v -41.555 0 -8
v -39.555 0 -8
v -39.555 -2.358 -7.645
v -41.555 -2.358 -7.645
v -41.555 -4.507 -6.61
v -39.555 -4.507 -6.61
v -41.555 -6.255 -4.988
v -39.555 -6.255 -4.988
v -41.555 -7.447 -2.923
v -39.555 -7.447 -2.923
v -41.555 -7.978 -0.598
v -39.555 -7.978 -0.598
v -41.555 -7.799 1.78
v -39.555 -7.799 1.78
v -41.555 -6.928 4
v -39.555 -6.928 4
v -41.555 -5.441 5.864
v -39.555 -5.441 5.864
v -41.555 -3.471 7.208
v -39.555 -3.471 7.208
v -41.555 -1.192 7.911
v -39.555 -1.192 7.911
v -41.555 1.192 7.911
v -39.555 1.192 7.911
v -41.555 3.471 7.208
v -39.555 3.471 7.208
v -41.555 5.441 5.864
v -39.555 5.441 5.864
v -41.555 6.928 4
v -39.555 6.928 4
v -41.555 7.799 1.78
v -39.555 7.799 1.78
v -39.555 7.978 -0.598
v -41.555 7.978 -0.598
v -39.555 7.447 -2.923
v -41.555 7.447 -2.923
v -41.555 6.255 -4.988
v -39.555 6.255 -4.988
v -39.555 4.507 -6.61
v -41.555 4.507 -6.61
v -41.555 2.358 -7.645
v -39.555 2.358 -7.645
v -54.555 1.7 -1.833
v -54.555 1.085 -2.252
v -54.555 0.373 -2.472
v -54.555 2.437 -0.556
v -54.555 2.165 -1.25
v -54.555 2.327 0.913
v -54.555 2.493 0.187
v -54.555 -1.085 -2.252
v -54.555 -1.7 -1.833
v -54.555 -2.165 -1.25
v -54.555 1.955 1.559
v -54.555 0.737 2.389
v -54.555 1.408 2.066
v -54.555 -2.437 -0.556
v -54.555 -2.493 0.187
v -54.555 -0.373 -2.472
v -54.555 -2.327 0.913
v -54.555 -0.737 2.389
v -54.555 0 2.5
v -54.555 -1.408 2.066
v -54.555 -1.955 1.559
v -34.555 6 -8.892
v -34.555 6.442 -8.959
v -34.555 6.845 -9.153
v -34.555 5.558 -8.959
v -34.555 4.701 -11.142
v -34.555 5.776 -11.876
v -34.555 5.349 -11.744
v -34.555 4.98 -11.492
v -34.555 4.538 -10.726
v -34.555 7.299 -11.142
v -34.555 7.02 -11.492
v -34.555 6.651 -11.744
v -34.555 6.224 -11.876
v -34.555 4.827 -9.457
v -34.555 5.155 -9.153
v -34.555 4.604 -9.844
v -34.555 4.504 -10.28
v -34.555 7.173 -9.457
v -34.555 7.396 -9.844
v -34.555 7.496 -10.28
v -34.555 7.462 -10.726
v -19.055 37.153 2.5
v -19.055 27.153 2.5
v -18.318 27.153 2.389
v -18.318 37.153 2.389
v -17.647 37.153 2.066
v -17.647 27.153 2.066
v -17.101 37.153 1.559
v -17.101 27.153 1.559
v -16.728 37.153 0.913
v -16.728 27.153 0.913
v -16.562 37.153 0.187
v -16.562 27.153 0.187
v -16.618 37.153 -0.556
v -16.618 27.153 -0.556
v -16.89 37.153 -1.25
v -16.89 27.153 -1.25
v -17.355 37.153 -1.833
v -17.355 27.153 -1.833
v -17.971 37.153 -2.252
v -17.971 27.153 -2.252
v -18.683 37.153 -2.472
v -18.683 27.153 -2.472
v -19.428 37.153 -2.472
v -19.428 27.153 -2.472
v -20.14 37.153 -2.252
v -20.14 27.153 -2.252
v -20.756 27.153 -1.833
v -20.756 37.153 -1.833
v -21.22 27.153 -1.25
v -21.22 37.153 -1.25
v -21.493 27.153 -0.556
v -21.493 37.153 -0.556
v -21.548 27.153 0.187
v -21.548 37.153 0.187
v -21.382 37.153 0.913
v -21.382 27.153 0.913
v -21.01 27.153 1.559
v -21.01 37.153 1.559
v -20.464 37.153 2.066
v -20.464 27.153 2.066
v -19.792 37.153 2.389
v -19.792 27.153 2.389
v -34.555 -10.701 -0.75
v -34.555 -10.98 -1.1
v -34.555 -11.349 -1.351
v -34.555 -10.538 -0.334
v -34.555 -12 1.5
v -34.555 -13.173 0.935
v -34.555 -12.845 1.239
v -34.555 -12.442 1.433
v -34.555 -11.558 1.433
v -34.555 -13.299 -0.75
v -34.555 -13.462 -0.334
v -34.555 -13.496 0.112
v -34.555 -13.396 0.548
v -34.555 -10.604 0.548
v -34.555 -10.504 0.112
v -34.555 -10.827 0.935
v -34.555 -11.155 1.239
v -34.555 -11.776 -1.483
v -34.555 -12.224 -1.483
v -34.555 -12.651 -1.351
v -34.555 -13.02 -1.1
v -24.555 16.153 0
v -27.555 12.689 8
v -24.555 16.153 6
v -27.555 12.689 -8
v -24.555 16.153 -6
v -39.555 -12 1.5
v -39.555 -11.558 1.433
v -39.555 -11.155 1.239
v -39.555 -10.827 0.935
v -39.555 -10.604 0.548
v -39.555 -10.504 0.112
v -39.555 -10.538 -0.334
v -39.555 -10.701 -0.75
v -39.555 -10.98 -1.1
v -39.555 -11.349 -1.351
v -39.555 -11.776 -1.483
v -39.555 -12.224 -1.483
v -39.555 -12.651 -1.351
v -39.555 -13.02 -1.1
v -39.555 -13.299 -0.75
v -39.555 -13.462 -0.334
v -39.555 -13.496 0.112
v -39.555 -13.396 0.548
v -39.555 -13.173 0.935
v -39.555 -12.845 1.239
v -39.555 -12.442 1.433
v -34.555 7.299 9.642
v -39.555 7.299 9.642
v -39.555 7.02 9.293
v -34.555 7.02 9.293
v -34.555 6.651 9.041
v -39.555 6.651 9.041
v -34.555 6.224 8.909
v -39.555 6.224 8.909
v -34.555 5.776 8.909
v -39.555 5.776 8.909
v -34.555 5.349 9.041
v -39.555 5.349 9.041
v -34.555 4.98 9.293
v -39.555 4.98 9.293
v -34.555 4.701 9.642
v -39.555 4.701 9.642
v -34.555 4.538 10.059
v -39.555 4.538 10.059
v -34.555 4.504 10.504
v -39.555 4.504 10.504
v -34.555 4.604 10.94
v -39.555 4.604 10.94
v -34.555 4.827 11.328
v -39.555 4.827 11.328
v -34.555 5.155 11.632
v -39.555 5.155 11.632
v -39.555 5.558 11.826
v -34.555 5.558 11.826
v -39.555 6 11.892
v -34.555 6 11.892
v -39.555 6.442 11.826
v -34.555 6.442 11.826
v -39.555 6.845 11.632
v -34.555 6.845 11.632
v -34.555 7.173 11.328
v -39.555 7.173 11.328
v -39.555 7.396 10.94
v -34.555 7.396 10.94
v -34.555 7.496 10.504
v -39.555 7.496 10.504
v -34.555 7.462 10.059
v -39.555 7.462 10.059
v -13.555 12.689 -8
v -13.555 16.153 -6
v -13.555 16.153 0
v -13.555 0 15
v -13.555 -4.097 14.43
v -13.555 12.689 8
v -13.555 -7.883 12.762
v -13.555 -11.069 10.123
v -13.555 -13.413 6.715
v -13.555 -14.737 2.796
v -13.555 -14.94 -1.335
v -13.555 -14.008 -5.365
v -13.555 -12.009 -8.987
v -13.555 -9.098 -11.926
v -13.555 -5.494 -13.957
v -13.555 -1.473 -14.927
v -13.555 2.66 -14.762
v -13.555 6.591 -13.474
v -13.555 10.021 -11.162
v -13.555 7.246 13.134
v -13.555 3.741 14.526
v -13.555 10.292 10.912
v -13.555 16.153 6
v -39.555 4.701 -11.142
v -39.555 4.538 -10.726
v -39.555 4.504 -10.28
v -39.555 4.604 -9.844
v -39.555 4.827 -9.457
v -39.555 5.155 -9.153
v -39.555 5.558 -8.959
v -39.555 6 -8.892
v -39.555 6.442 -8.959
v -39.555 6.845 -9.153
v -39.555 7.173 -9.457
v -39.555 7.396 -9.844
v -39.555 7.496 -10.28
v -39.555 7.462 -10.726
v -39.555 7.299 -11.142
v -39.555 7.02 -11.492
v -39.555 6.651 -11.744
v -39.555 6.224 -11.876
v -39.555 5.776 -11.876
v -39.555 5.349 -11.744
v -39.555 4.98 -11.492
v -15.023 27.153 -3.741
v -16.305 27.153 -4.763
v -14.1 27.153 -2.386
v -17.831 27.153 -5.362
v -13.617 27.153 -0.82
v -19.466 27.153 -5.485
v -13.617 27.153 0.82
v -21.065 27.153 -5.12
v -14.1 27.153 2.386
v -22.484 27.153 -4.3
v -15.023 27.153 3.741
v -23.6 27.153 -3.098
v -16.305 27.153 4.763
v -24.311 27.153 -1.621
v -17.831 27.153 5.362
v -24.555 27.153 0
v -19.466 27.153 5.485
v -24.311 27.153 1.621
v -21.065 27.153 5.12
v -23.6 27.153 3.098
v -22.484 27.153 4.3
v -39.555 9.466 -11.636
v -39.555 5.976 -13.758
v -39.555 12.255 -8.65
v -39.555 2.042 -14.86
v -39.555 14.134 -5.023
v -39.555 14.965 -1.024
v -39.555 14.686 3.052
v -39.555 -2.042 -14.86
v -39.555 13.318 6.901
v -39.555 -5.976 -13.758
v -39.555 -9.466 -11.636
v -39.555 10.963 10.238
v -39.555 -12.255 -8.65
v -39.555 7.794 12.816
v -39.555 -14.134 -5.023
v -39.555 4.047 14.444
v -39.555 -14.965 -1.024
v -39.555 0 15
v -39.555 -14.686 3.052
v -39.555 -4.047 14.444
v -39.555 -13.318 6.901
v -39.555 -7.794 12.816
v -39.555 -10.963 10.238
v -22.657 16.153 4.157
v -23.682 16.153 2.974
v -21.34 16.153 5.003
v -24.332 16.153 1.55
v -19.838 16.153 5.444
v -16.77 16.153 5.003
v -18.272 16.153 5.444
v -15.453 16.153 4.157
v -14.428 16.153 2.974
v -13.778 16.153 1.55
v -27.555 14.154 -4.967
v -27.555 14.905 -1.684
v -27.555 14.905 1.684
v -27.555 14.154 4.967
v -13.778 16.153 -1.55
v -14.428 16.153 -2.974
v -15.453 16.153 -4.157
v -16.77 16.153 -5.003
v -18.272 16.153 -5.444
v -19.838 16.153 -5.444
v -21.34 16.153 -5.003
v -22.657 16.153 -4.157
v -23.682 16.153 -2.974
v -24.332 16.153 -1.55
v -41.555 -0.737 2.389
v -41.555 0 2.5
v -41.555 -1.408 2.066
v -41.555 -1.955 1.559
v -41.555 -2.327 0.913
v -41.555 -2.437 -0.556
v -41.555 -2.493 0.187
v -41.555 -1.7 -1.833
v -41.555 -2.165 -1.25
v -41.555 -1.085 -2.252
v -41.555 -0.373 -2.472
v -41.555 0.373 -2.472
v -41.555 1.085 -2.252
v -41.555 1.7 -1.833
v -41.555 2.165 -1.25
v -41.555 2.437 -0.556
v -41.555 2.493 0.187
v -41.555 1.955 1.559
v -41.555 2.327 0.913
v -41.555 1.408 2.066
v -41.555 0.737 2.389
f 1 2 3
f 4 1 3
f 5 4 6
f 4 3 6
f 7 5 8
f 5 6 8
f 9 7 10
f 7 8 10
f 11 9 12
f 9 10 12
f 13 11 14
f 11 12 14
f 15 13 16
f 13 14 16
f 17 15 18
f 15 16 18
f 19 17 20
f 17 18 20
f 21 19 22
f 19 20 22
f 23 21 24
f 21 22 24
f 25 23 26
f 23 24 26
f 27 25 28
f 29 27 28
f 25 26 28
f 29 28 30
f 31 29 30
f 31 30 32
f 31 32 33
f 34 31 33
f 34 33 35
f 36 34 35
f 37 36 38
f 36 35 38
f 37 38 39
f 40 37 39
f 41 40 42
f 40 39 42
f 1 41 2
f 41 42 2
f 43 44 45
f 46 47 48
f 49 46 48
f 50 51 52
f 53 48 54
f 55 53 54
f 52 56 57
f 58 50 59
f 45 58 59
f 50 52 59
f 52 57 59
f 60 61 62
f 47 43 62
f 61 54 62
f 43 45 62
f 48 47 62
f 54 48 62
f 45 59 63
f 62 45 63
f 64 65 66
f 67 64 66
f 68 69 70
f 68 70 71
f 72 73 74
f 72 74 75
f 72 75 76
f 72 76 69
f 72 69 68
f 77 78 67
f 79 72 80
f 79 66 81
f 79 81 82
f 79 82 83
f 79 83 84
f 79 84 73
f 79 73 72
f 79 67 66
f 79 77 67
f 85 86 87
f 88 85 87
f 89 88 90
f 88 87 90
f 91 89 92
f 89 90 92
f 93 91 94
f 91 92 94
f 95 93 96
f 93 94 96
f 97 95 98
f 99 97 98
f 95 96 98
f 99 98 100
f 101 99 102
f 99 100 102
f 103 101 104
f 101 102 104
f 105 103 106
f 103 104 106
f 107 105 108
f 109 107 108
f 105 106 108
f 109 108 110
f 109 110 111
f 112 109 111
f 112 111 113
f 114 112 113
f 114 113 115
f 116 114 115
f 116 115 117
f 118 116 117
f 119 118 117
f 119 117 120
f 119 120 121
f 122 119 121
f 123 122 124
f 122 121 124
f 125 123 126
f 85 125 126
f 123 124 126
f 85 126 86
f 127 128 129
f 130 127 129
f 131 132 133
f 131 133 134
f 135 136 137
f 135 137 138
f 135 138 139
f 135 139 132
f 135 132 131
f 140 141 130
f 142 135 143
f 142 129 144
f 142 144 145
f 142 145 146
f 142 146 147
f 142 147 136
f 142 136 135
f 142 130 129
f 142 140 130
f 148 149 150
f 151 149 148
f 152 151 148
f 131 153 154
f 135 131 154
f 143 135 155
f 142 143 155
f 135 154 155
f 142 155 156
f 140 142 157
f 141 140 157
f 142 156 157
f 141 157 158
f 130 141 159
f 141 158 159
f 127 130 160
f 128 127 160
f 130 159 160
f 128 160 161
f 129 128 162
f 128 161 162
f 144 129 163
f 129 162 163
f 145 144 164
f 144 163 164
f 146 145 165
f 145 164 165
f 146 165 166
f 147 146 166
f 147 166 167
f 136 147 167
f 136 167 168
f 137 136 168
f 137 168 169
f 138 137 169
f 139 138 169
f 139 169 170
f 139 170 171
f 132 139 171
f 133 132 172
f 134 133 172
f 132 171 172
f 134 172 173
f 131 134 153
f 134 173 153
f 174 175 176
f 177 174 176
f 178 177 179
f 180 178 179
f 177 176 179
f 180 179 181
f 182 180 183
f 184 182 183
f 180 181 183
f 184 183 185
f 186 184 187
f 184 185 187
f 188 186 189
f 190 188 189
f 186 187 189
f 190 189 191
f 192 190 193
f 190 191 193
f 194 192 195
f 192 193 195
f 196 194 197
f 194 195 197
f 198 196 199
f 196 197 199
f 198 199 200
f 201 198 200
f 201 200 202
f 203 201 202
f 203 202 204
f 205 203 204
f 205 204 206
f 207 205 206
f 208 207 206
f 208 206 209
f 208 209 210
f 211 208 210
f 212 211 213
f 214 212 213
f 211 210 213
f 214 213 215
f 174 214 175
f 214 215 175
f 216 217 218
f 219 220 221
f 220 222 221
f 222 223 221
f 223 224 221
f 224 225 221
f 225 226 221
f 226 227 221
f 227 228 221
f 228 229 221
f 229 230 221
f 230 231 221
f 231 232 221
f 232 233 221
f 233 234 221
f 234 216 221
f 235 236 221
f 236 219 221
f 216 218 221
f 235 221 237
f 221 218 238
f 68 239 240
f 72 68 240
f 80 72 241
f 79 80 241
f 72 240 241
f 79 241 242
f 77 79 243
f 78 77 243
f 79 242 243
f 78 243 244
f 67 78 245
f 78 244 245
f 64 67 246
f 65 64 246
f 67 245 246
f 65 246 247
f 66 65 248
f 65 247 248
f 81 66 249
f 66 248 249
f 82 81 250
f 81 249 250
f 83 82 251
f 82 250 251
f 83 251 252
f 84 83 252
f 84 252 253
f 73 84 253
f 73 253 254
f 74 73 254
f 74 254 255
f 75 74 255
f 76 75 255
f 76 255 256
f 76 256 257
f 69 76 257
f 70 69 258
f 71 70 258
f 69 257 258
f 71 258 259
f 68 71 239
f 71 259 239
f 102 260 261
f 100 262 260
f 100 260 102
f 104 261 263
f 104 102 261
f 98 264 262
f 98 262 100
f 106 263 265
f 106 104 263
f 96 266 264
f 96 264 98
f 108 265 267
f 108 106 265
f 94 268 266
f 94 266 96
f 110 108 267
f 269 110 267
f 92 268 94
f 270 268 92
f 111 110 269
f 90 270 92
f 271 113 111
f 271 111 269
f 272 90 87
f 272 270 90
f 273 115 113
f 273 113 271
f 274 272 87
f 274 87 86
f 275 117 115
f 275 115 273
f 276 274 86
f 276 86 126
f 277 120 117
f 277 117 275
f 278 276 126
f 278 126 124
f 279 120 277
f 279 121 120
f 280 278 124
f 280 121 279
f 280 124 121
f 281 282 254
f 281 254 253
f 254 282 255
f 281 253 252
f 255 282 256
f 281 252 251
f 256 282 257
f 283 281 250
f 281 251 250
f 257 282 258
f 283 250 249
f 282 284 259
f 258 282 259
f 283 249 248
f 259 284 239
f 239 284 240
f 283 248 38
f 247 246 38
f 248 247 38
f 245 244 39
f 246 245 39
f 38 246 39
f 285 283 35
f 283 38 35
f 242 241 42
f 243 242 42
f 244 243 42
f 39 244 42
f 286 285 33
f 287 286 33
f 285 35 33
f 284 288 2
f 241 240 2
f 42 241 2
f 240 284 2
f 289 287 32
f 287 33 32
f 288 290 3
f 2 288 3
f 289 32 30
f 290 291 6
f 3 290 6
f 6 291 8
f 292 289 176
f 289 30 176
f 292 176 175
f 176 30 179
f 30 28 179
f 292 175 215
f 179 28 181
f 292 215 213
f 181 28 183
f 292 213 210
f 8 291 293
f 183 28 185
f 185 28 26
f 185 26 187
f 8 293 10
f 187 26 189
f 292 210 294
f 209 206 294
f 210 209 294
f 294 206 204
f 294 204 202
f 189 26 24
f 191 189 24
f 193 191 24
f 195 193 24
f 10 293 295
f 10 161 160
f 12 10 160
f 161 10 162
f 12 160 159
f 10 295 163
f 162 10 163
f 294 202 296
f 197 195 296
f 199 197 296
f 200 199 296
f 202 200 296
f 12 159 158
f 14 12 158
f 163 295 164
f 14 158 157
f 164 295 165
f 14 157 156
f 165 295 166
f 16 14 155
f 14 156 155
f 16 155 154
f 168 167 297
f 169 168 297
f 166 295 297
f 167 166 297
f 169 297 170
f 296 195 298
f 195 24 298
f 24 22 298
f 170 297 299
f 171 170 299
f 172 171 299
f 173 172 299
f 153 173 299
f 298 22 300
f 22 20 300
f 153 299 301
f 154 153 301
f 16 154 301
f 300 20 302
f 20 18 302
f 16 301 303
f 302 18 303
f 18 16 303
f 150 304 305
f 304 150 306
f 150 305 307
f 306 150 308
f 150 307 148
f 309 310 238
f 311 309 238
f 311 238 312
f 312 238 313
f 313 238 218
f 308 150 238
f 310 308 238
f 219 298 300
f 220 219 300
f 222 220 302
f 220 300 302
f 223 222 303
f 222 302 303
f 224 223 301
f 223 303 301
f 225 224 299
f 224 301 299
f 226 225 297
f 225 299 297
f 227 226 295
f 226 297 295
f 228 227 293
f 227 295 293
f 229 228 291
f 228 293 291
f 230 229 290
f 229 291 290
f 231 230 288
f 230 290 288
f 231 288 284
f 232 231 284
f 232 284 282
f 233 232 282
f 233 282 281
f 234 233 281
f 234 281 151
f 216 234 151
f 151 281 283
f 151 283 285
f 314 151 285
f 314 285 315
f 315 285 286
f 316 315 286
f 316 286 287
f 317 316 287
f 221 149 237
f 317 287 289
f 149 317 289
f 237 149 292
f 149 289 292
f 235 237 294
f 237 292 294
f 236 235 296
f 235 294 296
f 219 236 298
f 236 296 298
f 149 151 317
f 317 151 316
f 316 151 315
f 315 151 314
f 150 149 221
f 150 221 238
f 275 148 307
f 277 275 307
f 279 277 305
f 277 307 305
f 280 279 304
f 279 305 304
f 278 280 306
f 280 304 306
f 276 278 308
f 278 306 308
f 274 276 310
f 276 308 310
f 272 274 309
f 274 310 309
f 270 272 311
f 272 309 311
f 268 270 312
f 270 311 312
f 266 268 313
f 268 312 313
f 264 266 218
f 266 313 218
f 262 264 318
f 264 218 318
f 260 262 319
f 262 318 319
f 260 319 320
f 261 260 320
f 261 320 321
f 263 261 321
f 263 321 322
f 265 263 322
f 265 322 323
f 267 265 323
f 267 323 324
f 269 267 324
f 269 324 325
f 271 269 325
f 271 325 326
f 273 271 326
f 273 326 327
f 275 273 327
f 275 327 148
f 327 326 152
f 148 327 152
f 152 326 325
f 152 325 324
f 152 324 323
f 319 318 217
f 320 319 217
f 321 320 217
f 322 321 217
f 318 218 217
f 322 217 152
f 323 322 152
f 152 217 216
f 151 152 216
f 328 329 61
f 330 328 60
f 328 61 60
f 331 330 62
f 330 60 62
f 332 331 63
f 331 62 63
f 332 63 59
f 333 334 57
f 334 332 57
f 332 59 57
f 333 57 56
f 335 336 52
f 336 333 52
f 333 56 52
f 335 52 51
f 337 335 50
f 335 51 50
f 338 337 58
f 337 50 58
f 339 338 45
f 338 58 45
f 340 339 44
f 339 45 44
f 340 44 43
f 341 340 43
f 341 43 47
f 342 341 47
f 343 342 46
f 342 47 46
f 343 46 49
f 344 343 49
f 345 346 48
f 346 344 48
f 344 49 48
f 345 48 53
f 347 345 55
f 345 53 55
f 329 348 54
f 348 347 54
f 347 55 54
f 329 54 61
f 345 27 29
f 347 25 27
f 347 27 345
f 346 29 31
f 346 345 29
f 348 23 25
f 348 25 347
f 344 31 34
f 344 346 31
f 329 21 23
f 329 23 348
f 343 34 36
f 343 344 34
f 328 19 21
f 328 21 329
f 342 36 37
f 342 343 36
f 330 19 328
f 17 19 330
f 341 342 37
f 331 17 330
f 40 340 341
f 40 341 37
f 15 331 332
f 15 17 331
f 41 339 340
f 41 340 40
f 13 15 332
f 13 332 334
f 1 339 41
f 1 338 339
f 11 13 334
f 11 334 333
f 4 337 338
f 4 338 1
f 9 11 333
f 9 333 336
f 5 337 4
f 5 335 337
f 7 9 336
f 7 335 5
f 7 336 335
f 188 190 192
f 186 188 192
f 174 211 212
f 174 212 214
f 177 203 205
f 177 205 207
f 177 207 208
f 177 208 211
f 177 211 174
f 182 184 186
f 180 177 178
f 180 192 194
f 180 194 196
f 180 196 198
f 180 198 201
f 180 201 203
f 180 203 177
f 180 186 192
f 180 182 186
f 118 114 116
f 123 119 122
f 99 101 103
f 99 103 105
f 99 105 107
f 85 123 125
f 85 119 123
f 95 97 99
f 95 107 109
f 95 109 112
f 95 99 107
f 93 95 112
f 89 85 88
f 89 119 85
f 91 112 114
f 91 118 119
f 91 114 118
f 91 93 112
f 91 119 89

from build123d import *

# Parameters (mm, degrees)
ESQUISSE3_R                  = 1.5
ENL_V_MAT_EXTRU_1_DEPTH      = 5
R_P_TITION_CIRCULAIRE1_COUNT = 3
ESQUISSE4_R                  = 8
BOSS_EXTRU_1_DEPTH           = 2
BOSS_EXTRU_2_DEPTH           = 14
ENL_V_START                  = -8
ENL_V_MAT_EXTRU_2_DEPTH      = 16
ESQUISSE7_R                  = 5.5
BOSS_EXTRU_4_DEPTH           = 11
ESQUISSE8_R                  = 2.5
BOSS_EXTRU_5_DEPTH           = 10


# Read off the part's stored shape, not the designer's step: Enlèv. mat.-Extru.2
with BuildPart() as part:
    # Esquisse1 → Révolution1 (revolve)
    with BuildSketch(Plane.XY, mode=Mode.PRIVATE) as r_volution1_sk:
        Polygon((-13.555229236, 0), (-13.555229236, 15), (-39.555229236, 15), (-39.555229236, 2.5), (-54.555229236, 2.5), (-54.555229236, 0), align=None)
    revolve(r_volution1_sk.sketch.rotate(Axis((-72.521066027, 0, 0), (1, 0, 0)), 90), axis=Axis((-72.521066027, 0, 0), (1, 0, 0)))

    # Esquisse3 → Enlèv. mat.-Extru.1 (cut)
    with BuildSketch(Plane.ZY.offset(39.555229236)):
        with Locations((0, -12)):
            Circle(ESQUISSE3_R)
    enl_v_mat_extru_1 = extrude(amount=-ENL_V_MAT_EXTRU_1_DEPTH, mode=Mode.SUBTRACT)

    # Répétition circulaire1: Enlèv. mat.-Extru.1 ×3 about axis
    r_p_tition_circulaire1_axis = Axis((0, 0, 0), (1, 0, 0))
    for i in range(1, R_P_TITION_CIRCULAIRE1_COUNT):
        add(enl_v_mat_extru_1.rotate(r_p_tition_circulaire1_axis, i * 360 / R_P_TITION_CIRCULAIRE1_COUNT), mode=Mode.SUBTRACT)

    # Esquisse4 → Boss.-Extru.1 (add)
    with BuildSketch(Plane.ZY.offset(39.555229236)):
        with Locations(Location((0, 0, 0), (0, 0, 180))):
            Circle(ESQUISSE4_R)
    extrude(amount=BOSS_EXTRU_1_DEPTH)

    # Esquisse3D1 → Boss.-Extru.2 (add)
    with BuildSketch(Plane(origin=(-13.555229236, 12.68857754, 8), x_dir=(0, 0, -1), z_dir=(1, 0, 0))):
        Polygon((0, 0), (2, 3.464101615), (14, 3.464101615), (16, 0), align=None)
    extrude(amount=-BOSS_EXTRU_2_DEPTH)

    # Enlèv. mat.-Extru.2 outline → Enlèv. mat.-Extru.2 (cut)
    with BuildSketch(Plane.XY.offset(ENL_V_START)):
        Polygon((-27.555229236, 16.152679156), (-27.555229236, 12.68857754), (-24.555229236, 16.152679156), align=None)
    extrude(amount=ENL_V_MAT_EXTRU_2_DEPTH, mode=Mode.SUBTRACT)

    # Esquisse7 → Boss.-Extru.4 (add)
    with BuildSketch(Plane(origin=(0, 16.152679156, 0), x_dir=(1, 0, 0), z_dir=(0, 1, 0))):
        with Locations(Location((-19.055229236, 0, 0), (0, 0, 180))):
            Circle(ESQUISSE7_R)
    extrude(amount=BOSS_EXTRU_4_DEPTH)

    # Esquisse8 → Boss.-Extru.5 (add)
    with BuildSketch(Plane(origin=(0, 27.152679156, 0), x_dir=(1, 0, 0), z_dir=(0, 1, 0))):
        with Locations(Location((-19.055229236, 0, 0), (0, 0, 270))):
            Circle(ESQUISSE8_R)
    extrude(amount=BOSS_EXTRU_5_DEPTH)


solid = part.part
